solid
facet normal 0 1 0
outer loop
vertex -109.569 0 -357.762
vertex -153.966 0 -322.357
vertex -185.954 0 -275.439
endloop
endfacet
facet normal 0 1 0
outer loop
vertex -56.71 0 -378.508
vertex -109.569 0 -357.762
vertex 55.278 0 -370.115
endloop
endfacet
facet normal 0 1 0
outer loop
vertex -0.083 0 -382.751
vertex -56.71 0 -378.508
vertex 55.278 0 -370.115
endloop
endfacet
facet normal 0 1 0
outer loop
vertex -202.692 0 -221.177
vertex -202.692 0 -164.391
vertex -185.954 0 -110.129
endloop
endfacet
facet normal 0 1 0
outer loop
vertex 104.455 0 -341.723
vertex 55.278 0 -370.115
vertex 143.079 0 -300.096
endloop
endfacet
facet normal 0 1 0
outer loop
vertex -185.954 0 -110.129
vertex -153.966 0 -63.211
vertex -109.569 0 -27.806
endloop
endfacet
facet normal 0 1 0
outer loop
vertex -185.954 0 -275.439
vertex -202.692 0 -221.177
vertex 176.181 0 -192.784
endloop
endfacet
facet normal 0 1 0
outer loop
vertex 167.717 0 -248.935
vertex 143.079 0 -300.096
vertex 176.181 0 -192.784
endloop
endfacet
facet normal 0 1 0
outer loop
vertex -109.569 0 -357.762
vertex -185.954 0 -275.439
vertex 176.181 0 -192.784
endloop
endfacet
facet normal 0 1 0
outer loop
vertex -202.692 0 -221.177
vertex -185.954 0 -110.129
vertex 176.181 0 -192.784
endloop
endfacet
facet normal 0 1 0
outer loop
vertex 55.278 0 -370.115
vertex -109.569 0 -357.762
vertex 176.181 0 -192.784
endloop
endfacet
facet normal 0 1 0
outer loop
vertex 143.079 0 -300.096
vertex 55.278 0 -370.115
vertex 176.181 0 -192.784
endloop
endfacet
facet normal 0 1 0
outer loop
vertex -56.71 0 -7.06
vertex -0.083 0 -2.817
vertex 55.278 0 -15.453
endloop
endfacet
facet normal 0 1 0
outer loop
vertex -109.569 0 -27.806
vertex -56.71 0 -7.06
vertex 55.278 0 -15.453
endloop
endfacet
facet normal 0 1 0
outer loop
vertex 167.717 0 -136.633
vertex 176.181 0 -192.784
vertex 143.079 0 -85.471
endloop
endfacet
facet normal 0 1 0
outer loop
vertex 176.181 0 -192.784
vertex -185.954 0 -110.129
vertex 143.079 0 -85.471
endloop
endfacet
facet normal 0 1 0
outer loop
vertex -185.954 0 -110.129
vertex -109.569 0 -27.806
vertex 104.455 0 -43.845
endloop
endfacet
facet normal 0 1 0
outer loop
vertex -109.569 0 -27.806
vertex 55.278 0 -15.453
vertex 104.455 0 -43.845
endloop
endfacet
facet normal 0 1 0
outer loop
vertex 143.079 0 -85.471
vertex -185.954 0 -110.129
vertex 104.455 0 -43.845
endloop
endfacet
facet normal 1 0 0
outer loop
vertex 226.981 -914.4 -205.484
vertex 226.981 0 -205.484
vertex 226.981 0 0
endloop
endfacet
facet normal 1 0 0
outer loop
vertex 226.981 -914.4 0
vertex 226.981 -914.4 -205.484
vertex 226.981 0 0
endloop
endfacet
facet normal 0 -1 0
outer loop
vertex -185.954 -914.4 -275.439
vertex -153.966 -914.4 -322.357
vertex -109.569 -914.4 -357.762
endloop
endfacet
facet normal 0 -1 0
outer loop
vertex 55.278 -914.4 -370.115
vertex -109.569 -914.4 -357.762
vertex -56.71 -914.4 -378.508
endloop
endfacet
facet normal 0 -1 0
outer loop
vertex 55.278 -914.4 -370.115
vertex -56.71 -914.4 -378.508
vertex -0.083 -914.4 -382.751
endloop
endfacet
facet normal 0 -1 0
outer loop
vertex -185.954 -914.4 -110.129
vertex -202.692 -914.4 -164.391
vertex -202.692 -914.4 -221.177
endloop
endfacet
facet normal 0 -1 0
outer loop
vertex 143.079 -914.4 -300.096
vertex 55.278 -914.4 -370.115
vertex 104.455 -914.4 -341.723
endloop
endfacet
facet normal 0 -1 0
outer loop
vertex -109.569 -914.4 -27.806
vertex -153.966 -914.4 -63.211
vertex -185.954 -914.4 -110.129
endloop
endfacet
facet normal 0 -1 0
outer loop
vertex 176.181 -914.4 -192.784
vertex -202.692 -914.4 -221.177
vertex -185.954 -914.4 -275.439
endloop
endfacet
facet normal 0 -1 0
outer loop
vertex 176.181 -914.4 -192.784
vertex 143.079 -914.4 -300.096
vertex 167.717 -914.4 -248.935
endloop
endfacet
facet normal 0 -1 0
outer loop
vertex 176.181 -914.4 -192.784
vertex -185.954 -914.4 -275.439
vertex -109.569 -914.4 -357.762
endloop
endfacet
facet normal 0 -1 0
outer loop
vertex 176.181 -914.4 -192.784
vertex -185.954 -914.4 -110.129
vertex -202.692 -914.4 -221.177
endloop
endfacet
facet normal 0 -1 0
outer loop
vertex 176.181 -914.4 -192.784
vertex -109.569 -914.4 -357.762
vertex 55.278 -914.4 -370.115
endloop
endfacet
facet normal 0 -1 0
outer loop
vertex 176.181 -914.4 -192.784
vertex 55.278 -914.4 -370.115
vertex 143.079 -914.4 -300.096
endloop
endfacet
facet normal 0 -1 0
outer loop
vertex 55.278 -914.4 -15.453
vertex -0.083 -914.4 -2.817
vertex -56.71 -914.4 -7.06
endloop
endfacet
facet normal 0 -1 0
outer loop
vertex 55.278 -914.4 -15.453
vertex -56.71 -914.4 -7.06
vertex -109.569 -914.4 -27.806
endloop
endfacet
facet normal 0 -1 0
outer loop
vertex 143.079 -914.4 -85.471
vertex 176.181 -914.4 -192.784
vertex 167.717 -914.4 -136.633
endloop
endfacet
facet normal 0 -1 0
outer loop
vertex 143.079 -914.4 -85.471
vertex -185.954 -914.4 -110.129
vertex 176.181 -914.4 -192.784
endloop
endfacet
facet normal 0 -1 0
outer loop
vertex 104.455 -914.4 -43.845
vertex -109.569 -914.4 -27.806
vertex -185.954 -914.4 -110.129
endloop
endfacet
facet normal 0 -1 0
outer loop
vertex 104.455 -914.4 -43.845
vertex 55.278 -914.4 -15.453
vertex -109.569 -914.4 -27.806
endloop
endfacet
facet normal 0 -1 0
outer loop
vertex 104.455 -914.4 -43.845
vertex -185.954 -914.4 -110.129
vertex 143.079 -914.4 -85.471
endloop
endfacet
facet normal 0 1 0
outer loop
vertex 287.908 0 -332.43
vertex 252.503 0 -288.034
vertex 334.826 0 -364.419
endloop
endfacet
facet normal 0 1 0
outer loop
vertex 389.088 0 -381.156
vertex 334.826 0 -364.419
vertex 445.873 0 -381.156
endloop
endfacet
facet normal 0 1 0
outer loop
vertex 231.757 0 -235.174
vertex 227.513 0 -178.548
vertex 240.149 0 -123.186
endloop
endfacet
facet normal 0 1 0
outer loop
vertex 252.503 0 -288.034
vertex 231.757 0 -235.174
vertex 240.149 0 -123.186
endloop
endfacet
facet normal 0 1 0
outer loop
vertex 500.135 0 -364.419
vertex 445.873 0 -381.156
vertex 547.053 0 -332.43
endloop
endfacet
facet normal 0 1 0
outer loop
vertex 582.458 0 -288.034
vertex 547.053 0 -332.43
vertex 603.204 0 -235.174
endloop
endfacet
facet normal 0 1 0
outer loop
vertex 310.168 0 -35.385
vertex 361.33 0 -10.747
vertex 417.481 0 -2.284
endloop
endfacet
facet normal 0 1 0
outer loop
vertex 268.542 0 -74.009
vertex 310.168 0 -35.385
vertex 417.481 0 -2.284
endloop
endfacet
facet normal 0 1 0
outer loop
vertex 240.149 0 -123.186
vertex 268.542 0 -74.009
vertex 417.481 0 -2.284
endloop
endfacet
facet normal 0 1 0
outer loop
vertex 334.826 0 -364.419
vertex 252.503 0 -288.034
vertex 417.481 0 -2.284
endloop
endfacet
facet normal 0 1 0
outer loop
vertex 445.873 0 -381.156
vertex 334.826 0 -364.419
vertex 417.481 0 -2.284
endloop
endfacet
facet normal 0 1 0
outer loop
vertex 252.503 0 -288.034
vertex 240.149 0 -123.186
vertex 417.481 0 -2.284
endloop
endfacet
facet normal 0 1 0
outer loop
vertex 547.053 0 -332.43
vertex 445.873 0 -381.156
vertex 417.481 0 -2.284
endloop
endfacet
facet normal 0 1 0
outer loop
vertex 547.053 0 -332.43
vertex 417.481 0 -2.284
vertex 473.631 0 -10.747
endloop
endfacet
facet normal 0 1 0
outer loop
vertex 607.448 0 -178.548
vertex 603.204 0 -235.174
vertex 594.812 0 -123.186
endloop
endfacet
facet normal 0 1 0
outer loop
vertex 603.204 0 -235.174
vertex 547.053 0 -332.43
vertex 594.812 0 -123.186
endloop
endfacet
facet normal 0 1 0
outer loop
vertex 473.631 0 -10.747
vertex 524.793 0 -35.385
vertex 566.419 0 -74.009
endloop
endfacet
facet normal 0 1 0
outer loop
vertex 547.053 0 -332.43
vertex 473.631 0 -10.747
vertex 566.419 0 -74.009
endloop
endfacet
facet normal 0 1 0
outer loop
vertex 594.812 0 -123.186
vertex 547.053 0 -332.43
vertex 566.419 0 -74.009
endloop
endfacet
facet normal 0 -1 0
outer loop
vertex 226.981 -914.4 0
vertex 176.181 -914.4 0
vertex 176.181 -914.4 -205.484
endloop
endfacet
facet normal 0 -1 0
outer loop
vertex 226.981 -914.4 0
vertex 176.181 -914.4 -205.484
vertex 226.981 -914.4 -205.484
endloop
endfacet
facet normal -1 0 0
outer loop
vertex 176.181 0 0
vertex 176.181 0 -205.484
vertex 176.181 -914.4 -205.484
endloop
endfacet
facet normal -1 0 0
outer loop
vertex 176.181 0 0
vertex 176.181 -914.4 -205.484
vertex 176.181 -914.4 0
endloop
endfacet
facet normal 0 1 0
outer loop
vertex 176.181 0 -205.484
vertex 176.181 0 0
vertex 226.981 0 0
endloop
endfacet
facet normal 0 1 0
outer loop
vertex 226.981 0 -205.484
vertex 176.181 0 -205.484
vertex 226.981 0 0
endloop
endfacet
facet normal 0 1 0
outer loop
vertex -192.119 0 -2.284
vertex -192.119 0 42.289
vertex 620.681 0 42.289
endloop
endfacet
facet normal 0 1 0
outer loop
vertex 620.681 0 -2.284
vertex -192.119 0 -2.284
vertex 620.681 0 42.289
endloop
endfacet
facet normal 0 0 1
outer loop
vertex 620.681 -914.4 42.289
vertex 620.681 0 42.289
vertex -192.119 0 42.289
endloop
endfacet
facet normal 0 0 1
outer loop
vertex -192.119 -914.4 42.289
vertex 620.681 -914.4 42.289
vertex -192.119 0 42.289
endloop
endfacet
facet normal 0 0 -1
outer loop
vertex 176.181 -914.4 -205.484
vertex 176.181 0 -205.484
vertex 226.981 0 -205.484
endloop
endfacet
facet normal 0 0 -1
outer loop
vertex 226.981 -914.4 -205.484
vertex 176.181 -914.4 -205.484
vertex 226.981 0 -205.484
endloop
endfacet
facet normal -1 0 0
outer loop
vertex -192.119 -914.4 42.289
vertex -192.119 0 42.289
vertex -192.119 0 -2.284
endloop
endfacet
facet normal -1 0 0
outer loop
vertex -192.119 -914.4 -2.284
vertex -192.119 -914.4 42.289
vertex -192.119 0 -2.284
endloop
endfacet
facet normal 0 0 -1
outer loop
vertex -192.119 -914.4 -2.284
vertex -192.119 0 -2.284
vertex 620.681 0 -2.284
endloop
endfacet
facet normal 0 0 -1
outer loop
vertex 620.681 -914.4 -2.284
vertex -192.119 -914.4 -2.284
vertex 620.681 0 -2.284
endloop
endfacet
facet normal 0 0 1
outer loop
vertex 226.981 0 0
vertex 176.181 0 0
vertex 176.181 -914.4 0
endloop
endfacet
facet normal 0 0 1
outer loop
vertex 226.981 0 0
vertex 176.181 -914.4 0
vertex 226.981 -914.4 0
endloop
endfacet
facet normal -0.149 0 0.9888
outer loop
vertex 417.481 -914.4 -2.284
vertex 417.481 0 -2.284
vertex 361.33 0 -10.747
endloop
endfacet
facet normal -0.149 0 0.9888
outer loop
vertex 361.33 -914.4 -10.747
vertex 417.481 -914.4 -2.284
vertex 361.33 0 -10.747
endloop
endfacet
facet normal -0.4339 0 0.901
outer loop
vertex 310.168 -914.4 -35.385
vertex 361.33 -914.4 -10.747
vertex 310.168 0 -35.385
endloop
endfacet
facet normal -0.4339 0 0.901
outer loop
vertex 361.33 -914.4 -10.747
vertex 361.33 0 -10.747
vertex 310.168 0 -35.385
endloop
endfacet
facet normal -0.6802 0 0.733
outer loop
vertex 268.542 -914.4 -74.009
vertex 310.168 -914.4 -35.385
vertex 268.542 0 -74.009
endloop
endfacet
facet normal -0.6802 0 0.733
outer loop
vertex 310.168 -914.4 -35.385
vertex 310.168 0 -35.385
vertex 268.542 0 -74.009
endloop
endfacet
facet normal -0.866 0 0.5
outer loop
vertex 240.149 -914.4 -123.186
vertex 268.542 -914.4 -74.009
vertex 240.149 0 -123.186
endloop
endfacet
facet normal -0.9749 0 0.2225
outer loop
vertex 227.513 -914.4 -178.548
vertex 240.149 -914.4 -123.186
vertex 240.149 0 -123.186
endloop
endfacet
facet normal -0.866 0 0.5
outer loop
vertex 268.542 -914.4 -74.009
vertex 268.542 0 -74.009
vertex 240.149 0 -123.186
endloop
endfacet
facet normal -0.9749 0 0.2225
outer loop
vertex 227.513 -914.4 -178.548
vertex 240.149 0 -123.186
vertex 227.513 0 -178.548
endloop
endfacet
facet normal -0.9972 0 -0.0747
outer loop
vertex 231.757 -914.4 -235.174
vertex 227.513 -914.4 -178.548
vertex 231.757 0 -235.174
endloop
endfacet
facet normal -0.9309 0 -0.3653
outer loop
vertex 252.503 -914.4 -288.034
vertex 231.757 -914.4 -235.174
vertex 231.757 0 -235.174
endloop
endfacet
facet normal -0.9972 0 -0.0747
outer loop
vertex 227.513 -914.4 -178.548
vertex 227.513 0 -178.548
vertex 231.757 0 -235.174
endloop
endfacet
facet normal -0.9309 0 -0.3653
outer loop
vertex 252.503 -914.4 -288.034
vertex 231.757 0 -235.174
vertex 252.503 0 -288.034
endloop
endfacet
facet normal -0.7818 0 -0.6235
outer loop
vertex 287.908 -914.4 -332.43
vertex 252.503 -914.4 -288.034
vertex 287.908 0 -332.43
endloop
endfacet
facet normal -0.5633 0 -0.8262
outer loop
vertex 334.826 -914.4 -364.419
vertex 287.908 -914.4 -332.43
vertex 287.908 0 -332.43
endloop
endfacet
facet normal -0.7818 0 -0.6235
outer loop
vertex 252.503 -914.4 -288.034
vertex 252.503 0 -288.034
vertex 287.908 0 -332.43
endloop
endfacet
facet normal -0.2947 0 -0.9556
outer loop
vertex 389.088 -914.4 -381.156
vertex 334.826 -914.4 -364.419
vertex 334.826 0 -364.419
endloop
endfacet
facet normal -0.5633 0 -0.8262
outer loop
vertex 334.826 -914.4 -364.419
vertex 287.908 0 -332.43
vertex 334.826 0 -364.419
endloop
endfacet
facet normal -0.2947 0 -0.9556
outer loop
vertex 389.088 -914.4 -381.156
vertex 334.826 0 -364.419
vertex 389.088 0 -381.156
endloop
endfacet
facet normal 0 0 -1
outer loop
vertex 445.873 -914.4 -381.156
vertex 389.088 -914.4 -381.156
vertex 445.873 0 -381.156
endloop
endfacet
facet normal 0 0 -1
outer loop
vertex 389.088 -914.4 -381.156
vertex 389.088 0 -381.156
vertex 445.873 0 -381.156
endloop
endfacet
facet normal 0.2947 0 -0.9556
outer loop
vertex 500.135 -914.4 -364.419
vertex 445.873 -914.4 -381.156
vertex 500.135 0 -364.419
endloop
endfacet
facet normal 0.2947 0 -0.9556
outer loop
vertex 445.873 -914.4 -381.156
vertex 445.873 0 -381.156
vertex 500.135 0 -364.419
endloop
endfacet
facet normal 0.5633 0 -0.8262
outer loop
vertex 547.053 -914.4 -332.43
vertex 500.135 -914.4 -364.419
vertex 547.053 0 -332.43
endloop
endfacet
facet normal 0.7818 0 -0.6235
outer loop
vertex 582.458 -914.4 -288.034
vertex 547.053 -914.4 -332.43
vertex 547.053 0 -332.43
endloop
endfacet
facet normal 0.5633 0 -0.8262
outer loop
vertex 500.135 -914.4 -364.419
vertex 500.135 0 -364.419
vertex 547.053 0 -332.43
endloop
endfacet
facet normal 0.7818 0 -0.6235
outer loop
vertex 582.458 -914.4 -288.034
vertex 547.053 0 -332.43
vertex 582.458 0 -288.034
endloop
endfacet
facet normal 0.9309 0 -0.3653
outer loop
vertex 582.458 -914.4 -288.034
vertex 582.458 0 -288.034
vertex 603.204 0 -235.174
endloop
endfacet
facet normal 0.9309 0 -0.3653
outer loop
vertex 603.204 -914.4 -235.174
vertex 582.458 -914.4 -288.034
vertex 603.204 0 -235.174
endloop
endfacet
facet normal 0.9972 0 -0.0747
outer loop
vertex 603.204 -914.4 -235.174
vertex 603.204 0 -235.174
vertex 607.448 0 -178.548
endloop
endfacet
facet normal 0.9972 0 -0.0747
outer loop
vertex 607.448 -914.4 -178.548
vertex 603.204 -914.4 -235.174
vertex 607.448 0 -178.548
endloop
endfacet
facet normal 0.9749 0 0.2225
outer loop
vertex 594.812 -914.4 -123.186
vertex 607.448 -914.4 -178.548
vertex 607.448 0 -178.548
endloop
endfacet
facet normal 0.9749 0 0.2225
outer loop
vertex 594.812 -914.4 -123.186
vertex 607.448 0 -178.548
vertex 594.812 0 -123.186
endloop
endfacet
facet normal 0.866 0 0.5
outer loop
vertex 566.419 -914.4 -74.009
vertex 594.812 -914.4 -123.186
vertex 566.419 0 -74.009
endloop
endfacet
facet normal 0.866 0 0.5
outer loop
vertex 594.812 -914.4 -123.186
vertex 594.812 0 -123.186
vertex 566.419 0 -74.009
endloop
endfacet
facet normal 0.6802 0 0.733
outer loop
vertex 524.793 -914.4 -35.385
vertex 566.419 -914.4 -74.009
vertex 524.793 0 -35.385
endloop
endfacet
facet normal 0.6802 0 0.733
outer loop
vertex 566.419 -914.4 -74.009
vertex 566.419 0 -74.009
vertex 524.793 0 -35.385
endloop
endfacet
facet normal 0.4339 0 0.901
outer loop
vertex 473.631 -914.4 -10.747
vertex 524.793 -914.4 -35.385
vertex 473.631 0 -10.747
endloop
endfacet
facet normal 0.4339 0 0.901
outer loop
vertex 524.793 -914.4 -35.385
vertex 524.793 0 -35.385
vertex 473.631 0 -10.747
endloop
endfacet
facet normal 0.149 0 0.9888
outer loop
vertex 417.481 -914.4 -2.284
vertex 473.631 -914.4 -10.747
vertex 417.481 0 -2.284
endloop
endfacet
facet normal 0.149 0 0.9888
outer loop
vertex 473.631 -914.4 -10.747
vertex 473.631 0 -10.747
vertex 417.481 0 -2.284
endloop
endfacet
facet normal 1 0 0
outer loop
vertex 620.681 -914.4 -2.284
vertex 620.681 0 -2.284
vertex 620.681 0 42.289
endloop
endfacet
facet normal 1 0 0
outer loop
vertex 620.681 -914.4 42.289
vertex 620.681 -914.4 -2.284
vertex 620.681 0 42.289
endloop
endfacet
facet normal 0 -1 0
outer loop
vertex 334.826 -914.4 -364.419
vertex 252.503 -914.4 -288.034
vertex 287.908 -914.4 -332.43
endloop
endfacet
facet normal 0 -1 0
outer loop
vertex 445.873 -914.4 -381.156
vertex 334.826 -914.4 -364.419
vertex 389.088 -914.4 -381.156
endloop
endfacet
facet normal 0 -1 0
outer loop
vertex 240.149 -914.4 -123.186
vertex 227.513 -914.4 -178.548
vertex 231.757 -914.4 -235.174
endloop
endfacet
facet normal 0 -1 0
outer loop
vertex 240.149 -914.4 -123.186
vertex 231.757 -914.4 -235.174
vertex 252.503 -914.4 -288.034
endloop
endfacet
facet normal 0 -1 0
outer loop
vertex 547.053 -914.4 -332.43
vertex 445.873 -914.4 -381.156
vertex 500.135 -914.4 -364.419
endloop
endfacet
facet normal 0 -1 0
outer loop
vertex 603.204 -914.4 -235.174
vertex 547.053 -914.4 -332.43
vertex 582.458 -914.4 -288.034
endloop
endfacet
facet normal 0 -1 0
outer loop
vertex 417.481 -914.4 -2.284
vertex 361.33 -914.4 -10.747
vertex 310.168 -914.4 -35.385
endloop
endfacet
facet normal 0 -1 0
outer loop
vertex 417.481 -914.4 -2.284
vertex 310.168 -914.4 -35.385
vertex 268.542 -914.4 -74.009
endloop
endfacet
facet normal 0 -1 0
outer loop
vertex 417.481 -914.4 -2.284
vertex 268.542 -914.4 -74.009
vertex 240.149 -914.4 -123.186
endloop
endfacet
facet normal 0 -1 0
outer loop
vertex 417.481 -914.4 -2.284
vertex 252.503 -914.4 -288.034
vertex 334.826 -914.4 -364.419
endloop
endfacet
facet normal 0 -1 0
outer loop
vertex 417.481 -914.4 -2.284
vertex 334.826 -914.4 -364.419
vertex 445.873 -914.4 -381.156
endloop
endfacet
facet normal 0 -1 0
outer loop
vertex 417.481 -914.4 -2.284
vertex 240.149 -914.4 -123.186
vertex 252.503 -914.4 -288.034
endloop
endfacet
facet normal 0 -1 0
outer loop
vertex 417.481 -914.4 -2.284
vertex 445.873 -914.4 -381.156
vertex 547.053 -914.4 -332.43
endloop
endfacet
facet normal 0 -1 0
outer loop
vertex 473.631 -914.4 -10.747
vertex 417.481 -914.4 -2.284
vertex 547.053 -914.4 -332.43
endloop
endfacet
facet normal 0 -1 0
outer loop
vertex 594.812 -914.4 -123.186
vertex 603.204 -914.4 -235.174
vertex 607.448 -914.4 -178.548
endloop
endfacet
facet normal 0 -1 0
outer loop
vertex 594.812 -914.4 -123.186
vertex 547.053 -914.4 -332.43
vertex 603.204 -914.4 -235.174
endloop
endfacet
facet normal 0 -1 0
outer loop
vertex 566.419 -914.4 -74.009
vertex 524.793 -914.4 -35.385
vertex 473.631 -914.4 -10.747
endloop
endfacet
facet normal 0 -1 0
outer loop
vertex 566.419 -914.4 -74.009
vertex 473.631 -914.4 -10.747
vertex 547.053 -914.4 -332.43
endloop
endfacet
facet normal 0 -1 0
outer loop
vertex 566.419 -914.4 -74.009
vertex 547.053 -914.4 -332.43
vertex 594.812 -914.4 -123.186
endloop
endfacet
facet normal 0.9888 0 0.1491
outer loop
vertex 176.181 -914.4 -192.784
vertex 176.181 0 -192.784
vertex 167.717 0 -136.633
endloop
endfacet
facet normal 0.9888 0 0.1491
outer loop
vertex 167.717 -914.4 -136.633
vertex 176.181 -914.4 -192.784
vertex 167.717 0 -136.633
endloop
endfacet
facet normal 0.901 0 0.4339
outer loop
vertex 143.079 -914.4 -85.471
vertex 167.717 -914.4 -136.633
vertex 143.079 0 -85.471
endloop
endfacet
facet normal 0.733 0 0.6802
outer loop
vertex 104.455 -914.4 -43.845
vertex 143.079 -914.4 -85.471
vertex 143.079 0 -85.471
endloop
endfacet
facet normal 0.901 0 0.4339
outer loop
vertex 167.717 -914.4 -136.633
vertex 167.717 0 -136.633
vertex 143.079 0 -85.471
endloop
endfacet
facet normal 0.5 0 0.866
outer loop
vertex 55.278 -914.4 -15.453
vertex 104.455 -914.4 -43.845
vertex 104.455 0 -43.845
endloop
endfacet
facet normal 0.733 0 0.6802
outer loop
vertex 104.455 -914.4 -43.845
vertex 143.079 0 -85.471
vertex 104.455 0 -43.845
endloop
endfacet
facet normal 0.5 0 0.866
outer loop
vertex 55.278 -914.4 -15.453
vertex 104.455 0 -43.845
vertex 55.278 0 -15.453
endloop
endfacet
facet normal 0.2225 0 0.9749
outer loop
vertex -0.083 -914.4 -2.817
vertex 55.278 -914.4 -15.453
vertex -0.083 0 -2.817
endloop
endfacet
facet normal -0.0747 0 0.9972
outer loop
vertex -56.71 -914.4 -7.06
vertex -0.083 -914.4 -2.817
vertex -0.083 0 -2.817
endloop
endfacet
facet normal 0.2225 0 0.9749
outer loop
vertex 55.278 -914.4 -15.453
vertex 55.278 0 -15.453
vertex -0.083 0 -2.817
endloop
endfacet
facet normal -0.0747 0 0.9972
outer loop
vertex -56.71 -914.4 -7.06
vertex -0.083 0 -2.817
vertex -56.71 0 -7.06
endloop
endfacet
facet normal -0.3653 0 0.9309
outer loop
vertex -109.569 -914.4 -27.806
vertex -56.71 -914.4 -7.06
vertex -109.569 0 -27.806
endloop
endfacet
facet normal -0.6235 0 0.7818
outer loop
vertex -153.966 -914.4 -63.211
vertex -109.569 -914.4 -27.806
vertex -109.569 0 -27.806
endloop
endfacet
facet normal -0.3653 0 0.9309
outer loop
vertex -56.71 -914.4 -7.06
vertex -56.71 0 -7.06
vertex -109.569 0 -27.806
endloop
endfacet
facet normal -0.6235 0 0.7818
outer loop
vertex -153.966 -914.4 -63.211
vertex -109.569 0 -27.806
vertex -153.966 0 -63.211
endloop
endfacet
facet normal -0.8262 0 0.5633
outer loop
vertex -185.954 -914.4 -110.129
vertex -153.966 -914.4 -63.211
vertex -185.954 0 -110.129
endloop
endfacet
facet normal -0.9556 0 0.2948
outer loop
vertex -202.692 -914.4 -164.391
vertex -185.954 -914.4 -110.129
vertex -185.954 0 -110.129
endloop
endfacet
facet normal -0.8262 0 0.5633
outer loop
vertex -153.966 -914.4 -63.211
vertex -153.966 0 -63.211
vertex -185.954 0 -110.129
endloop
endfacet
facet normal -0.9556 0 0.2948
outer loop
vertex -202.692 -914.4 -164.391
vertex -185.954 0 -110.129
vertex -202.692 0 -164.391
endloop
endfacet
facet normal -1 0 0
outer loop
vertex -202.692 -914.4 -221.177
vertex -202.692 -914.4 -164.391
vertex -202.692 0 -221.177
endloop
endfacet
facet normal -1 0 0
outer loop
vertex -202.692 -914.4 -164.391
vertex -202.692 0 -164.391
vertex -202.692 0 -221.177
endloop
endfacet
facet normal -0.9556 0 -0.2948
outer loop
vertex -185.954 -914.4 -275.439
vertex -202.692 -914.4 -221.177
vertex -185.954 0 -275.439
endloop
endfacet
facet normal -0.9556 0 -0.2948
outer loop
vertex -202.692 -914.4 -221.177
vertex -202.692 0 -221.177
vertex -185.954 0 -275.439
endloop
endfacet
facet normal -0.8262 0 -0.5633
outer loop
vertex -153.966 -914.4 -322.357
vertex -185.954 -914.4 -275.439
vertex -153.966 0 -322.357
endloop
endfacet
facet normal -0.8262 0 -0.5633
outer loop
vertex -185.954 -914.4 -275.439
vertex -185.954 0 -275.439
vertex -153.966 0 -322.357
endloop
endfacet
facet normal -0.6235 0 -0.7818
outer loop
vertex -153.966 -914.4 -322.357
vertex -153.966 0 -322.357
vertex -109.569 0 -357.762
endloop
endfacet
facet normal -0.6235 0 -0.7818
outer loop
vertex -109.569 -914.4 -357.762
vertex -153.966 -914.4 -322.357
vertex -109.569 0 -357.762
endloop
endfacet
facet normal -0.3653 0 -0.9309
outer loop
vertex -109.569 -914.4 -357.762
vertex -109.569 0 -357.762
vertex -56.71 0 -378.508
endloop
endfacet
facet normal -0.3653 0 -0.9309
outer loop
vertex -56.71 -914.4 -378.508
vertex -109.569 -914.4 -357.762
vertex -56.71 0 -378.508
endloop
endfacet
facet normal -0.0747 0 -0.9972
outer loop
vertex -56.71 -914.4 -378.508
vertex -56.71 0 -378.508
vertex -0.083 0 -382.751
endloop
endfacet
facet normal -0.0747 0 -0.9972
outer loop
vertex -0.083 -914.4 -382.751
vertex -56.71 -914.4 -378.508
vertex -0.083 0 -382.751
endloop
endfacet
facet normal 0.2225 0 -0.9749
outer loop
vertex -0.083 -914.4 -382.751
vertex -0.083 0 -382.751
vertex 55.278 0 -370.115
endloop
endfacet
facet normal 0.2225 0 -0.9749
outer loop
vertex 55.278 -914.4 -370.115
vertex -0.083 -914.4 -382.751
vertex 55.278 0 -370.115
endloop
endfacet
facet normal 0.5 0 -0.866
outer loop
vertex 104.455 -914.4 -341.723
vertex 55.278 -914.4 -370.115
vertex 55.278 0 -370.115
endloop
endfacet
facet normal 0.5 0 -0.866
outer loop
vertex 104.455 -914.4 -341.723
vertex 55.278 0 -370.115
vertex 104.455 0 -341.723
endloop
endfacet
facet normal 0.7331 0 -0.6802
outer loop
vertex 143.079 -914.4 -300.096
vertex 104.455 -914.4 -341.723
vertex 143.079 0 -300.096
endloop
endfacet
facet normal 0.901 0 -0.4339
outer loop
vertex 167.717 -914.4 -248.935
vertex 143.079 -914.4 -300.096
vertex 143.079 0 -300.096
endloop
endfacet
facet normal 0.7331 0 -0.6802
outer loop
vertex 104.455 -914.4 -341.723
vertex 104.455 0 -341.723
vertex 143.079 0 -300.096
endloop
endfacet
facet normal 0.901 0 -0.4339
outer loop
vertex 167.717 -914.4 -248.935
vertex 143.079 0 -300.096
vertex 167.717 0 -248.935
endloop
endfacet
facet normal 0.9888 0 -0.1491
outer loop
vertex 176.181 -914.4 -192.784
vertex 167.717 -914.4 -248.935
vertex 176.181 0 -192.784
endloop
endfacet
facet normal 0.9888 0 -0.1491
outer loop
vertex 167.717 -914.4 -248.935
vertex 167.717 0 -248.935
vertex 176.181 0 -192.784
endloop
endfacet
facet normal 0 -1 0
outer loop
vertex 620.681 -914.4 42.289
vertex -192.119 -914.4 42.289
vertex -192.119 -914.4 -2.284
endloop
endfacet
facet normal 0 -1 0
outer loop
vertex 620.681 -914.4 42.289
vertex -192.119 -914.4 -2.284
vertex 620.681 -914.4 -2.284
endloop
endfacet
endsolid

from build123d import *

# Parameters (mm, degrees)
F3_DEPTH = 914.4
F2_R     = 190.5
F1_W     = 50.8
F1_H     = 205.4839522385


with BuildPart() as f3:
    # F0 (on Front) → F3 (new body)
    with BuildSketch(Plane.XZ):
        with BuildLine():
            ThreePointArc((607.9805202276, -192.7839522385), (552.1843620024, -58.0801103812), (417.4805201111, -2.2839522385))
            ThreePointArc((417.4805201111, -2.2839522385), (282.7766784527, -327.4877940957), (607.9805202276, -192.7839522385))
        make_face()
    extrude(amount=F3_DEPTH)


with BuildPart() as f3b:
    # F0 (on Front) → F3, piece 2 (new body)
    with BuildSketch(Plane.XZ):
        Polygon((620.6805202276, 42.2889534779), (-192.1194797724, 42.2889534779), (-192.1194797724, -2.2839522385), (417.4805201111, -2.2839522385), (620.6805202276, -2.2839522385), align=None)
    extrude(amount=F3_DEPTH)


with BuildPart() as f3c:
    # F2 (on Front) → F3, piece 3 (new body)
    with BuildSketch(Plane.XZ):
        with Locations((-14.3194797724, -192.7839522385)):
            Circle(F2_R)
    extrude(amount=F3_DEPTH)


with BuildPart() as f3d:
    # F1 (on Front) → F3, piece 4 (new body)
    with BuildSketch(Plane.XZ):
        with Locations((201.5805202276, -102.7419761192)):
            Rectangle(F1_W, F1_H)
    extrude(amount=F3_DEPTH)


solid = Compound([f3.part, f3b.part, f3c.part, f3d.part])
